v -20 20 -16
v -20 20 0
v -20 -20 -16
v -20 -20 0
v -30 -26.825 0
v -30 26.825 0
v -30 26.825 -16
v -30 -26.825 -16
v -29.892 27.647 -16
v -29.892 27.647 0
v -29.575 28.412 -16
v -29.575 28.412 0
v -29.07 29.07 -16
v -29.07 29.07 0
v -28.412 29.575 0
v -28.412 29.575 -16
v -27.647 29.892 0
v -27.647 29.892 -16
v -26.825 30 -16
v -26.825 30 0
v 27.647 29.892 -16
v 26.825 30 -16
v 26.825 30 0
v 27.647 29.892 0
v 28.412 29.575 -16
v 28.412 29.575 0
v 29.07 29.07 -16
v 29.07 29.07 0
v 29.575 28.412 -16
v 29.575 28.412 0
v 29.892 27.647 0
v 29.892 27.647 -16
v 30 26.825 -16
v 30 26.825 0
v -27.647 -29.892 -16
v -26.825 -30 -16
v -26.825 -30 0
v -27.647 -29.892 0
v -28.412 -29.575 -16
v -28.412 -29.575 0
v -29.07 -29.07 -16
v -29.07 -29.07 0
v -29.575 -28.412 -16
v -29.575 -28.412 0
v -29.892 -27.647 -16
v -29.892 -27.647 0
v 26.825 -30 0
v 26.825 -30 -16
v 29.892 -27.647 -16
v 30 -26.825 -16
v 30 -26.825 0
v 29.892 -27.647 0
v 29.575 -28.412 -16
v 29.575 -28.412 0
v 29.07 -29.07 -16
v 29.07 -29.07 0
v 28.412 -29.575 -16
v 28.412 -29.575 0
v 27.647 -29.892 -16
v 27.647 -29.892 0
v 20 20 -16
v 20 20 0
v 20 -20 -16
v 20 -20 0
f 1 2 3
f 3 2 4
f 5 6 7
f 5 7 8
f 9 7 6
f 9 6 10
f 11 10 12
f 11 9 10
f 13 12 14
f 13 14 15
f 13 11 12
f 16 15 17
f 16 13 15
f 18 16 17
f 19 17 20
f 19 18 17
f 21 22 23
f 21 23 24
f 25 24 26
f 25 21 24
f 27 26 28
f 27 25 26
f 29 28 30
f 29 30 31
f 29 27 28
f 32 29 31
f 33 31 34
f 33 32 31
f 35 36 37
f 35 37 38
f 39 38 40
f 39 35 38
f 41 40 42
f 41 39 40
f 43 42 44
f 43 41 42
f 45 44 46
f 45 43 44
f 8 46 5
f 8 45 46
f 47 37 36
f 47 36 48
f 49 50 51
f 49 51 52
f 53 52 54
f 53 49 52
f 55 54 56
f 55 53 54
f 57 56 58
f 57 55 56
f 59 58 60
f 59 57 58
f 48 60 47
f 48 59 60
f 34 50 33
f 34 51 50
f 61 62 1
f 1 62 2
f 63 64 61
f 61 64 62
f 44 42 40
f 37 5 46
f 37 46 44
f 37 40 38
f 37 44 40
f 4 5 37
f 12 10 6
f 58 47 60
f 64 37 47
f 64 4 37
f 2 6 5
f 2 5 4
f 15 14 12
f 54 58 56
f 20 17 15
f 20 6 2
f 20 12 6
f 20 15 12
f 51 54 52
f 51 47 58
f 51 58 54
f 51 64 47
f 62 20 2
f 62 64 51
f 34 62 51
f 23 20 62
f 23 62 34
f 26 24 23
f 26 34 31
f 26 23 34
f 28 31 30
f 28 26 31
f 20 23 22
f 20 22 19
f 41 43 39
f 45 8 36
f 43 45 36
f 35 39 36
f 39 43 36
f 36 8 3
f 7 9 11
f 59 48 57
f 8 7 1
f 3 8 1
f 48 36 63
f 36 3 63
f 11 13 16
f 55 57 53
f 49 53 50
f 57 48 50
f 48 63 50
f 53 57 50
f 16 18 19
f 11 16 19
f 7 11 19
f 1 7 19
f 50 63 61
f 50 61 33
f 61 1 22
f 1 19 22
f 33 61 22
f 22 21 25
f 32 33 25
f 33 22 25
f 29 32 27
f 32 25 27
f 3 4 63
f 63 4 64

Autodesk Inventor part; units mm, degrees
ref_plane "YZ Plane" through (0, 0, 0) normal (1, 0, 0) x (0, 1, 0)
ref_plane "XZ Plane" through (0, 0, 0) normal (0, 1, 0) x (-1, 0, 0)
ref_plane "XY Plane" through (0, 0, 0) normal (0, 0, 1) x (1, 0, 0)
sketch "Sketch1" plane through (0, 0, 0) normal (0, 0, 1) x (1, 0, 0)
  line L0 (-30, -30) -> (30, -30)
  line L1 (30, -30) -> (30, 30)
  line L2 (30, 30) -> (-30, 30)
  line L3 (-30, 30) -> (-30, -30)
  line L4 (-30, -30) -> (30, 30) construction
  line L5 (30, -30) -> (-30, 30) construction
  point P0 (0, 0)
  dimension "d0" = 60
extrude "Extrusion1" add sketch "Sketch1" against normal blind 16
fillet "Fillet1" radius 3.175 4 edges at (-30, 30, -8) (30, 30, -8) (30, -30, -8) (-30, -30, -8)
sketch "Sketch2" plane through (0, 0, 0) normal (0, 0, 1) x (1, 0, 0)
  line L0 (-20, -20) -> (20, -20)
  line L1 (20, -20) -> (20, 20)
  line L2 (20, 20) -> (-20, 20)
  line L3 (-20, 20) -> (-20, -20)
  line L4 (-20, -20) -> (20, 20) construction
  line L5 (20, -20) -> (-20, 20) construction
  point P0 (0, 0)
  dimension "d4" = 40
extrude "Extrusion2" cut sketch "Sketch2" against normal blind 16
properties part number "Fan 60x60x16"
